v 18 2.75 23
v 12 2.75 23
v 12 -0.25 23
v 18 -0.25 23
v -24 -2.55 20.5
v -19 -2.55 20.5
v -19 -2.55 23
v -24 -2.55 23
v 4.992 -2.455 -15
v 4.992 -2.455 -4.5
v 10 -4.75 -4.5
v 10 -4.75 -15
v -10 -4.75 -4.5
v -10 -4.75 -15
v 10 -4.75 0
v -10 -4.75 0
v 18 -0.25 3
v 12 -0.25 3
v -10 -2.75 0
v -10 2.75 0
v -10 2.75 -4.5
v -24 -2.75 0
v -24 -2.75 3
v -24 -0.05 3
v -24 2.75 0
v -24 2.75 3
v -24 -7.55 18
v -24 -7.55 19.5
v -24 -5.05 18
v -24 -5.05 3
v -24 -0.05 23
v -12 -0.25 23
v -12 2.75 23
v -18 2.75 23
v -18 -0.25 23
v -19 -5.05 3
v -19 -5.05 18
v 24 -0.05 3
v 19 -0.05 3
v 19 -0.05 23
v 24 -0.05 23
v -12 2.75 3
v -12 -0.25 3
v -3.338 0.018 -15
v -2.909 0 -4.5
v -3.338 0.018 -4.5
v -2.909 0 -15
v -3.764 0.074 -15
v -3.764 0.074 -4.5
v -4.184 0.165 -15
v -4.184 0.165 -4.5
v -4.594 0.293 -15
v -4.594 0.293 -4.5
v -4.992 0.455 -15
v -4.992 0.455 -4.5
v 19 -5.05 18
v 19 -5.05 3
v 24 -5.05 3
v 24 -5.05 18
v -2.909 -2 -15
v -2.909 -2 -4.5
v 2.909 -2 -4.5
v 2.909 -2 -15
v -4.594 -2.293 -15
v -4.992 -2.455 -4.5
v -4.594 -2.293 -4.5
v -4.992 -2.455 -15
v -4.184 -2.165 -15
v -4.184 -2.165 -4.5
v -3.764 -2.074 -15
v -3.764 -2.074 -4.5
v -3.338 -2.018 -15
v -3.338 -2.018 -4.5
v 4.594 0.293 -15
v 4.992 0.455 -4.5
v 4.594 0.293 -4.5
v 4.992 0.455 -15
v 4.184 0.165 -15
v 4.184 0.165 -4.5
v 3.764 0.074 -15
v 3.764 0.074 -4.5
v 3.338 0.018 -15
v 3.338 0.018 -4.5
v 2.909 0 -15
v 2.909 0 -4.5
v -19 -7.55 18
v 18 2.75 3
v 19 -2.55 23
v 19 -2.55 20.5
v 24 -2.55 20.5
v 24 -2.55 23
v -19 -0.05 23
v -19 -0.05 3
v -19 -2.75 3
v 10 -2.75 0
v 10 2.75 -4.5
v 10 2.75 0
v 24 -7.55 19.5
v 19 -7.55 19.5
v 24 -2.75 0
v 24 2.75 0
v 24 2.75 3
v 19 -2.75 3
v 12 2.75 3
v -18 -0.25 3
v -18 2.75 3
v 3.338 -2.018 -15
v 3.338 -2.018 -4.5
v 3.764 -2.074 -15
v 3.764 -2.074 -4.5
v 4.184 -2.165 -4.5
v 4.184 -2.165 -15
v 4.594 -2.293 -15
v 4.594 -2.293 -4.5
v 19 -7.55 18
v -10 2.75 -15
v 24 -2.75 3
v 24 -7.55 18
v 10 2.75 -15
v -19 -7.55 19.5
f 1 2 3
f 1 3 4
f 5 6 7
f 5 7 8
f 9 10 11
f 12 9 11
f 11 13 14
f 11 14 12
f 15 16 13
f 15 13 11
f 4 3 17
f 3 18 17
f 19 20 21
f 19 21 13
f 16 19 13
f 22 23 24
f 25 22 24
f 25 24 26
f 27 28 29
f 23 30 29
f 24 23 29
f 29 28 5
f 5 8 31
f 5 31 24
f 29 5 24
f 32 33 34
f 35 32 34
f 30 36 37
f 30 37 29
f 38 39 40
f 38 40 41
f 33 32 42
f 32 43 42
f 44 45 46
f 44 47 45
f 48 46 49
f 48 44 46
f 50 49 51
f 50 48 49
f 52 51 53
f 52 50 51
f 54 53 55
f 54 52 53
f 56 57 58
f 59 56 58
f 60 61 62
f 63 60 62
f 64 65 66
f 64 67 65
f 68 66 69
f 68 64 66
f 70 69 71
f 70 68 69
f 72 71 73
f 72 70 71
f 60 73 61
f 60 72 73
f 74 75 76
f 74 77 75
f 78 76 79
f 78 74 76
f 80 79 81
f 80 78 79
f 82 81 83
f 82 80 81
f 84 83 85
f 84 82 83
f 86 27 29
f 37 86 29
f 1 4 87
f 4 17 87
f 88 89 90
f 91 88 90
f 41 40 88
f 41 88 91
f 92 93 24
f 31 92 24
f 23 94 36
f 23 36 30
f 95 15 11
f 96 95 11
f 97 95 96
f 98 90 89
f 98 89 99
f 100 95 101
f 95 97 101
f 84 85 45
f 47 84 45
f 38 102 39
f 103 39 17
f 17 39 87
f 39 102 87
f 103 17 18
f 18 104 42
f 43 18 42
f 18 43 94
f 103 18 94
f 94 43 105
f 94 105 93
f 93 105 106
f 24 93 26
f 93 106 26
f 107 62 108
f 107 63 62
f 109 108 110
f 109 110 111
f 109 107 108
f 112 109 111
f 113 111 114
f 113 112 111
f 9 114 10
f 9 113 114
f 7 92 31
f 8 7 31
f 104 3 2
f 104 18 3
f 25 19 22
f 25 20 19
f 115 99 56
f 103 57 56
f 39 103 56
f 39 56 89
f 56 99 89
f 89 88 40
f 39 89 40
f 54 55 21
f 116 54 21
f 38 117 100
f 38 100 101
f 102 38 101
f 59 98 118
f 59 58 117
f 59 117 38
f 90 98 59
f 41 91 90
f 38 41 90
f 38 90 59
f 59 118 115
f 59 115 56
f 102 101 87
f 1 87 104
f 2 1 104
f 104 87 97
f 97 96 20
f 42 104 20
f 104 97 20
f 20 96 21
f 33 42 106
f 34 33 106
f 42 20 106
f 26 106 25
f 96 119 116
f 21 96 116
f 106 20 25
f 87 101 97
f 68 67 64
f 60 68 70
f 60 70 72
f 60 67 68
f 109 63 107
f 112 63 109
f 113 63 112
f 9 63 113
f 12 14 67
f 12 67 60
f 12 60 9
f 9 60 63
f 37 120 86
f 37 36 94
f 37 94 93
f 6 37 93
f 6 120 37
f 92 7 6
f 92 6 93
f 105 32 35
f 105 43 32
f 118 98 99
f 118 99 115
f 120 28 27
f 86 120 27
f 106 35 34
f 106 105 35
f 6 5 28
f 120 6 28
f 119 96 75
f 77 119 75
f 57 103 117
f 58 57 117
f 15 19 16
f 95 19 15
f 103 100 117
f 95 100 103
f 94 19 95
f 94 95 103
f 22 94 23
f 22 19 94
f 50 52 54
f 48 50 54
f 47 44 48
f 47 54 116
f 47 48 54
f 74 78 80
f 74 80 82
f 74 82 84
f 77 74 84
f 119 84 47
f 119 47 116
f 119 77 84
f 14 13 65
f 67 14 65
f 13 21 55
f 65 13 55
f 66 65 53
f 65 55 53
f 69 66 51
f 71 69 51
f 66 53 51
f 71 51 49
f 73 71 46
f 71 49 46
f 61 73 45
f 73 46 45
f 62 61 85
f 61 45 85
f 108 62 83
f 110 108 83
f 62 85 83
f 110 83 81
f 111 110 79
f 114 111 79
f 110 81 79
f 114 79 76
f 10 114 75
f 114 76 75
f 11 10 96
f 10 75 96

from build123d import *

# Parameters (mm, degrees)
F0_W      = 14
F0_H      = 5.5
F1_DEPTH  = 3
F0_W_2    = 10
F0_H_2    = 2
F2_DEPTH  = 4.5
F4_DEPTH  = 10.5
F5_W      = 6
F5_H      = 3
F5_W_2    = 5
F5_H_2    = 2.7
F5_H_3    = 2.3
F6_DEPTH  = 15
F6_FACE_W = 6
F6_FACE_H = 3
F7_W      = 5
F7_H      = 2.5
F8_DEPTH  = 5
F10_DEPTH = 5
F12_R     = 5


# Not quite as in the source:
# - a feature names something its author has since deleted; it is built from what else it names


with BuildPart() as f1:
    # F0 (on Top) → F1 (new body)
    with BuildSketch(Plane.XY):
        with Locations((17, 0)):
            Rectangle(F0_W, F0_H)
        Polygon((0, -2.75), (10, -2.75), (10, 2.75), (-10, 2.75), (-10, -2.75), align=None)
    extrude(amount=F1_DEPTH)

    # F0 (on Top) → F2 (join)
    with BuildSketch(Plane.XY):
        Polygon((0, -2.75), (10, -2.75), (10, 2.75), (-10, 2.75), (-10, -2.75), align=None)
        with Locations((-5, -3.75)):
            Rectangle(F0_W_2, F0_H_2)
        with Locations((5, -3.75)):
            Rectangle(F0_W_2, F0_H_2)
    extrude(amount=-F2_DEPTH)

    # F3 (on face) → F4 (join)
    with BuildSketch(Plane(origin=(0, 0, -4.5), x_dir=(1, 0, 0), z_dir=(0, 0, -1))):
        Polygon((0, -2.75), (10, -2.75), (4, 0), (0, 0), align=None)
        Polygon((-10, -2.75), (0, -2.75), (0, 0), (-4, 0), align=None)
        Polygon((4, 2), (10, 4.75), (0, 4.75), (0, 2), align=None)
        Polygon((-4, 2), (0, 2), (0, 4.75), (-10, 4.75), align=None)
    extrude(amount=F4_DEPTH)

    # F5 (on face) → F6 (join)
    with BuildSketch(Plane.XY.offset(3)):
        with Locations((15, 1.25)):
            Rectangle(F5_W, F5_H)
        with Locations((21.5, -1.4)):
            Rectangle(F5_W_2, F5_H_2)
        with Locations((21.5, -3.9)):
            Rectangle(F5_W_2, F5_H_3)
    extrude(amount=F6_DEPTH)

    # F6_face (on face) + F7 (on face) → F8 (join)
    with BuildSketch(Plane(origin=(21.5, -2.55, 18), x_dir=(1, 0, 0), z_dir=(0, 0, 1))):
        with Locations((-6.5, 3.8)):
            Rectangle(F6_FACE_W, F6_FACE_H)
    with BuildSketch(Plane.XY.offset(18)):
        with Locations((21.5, -1.3)):
            Rectangle(F7_W, F7_H)
    extrude(amount=F8_DEPTH)

    # F9 (on face) → F10 (join)
    with BuildSketch(Plane.YZ.offset(24)):
        Polygon((-5.05, 18), (-2.55, 18), (-2.55, 19.5), (-7.55, 19.5), (-7.55, 18), align=None)
        Polygon((-7.55, 19.5), (-2.55, 19.5), (-2.55, 20.5), align=None)
    extrude(amount=-F10_DEPTH)

    # F11: F1 across plane


with BuildPart() as f1_1:
    add(f1.part)
    add(f1.part.mirror(Plane.YZ))

    # F12
    f12_edges = [f1_1.edges().sort_by_distance(p)[0] for p in [
        (-4, -2, -9.75),
        (4, -2, -9.75),
        (4, 0, -9.75),
        (-4, 0, -9.75),
    ]]
    fillet(f12_edges, radius=F12_R)


solid = f1_1.part
